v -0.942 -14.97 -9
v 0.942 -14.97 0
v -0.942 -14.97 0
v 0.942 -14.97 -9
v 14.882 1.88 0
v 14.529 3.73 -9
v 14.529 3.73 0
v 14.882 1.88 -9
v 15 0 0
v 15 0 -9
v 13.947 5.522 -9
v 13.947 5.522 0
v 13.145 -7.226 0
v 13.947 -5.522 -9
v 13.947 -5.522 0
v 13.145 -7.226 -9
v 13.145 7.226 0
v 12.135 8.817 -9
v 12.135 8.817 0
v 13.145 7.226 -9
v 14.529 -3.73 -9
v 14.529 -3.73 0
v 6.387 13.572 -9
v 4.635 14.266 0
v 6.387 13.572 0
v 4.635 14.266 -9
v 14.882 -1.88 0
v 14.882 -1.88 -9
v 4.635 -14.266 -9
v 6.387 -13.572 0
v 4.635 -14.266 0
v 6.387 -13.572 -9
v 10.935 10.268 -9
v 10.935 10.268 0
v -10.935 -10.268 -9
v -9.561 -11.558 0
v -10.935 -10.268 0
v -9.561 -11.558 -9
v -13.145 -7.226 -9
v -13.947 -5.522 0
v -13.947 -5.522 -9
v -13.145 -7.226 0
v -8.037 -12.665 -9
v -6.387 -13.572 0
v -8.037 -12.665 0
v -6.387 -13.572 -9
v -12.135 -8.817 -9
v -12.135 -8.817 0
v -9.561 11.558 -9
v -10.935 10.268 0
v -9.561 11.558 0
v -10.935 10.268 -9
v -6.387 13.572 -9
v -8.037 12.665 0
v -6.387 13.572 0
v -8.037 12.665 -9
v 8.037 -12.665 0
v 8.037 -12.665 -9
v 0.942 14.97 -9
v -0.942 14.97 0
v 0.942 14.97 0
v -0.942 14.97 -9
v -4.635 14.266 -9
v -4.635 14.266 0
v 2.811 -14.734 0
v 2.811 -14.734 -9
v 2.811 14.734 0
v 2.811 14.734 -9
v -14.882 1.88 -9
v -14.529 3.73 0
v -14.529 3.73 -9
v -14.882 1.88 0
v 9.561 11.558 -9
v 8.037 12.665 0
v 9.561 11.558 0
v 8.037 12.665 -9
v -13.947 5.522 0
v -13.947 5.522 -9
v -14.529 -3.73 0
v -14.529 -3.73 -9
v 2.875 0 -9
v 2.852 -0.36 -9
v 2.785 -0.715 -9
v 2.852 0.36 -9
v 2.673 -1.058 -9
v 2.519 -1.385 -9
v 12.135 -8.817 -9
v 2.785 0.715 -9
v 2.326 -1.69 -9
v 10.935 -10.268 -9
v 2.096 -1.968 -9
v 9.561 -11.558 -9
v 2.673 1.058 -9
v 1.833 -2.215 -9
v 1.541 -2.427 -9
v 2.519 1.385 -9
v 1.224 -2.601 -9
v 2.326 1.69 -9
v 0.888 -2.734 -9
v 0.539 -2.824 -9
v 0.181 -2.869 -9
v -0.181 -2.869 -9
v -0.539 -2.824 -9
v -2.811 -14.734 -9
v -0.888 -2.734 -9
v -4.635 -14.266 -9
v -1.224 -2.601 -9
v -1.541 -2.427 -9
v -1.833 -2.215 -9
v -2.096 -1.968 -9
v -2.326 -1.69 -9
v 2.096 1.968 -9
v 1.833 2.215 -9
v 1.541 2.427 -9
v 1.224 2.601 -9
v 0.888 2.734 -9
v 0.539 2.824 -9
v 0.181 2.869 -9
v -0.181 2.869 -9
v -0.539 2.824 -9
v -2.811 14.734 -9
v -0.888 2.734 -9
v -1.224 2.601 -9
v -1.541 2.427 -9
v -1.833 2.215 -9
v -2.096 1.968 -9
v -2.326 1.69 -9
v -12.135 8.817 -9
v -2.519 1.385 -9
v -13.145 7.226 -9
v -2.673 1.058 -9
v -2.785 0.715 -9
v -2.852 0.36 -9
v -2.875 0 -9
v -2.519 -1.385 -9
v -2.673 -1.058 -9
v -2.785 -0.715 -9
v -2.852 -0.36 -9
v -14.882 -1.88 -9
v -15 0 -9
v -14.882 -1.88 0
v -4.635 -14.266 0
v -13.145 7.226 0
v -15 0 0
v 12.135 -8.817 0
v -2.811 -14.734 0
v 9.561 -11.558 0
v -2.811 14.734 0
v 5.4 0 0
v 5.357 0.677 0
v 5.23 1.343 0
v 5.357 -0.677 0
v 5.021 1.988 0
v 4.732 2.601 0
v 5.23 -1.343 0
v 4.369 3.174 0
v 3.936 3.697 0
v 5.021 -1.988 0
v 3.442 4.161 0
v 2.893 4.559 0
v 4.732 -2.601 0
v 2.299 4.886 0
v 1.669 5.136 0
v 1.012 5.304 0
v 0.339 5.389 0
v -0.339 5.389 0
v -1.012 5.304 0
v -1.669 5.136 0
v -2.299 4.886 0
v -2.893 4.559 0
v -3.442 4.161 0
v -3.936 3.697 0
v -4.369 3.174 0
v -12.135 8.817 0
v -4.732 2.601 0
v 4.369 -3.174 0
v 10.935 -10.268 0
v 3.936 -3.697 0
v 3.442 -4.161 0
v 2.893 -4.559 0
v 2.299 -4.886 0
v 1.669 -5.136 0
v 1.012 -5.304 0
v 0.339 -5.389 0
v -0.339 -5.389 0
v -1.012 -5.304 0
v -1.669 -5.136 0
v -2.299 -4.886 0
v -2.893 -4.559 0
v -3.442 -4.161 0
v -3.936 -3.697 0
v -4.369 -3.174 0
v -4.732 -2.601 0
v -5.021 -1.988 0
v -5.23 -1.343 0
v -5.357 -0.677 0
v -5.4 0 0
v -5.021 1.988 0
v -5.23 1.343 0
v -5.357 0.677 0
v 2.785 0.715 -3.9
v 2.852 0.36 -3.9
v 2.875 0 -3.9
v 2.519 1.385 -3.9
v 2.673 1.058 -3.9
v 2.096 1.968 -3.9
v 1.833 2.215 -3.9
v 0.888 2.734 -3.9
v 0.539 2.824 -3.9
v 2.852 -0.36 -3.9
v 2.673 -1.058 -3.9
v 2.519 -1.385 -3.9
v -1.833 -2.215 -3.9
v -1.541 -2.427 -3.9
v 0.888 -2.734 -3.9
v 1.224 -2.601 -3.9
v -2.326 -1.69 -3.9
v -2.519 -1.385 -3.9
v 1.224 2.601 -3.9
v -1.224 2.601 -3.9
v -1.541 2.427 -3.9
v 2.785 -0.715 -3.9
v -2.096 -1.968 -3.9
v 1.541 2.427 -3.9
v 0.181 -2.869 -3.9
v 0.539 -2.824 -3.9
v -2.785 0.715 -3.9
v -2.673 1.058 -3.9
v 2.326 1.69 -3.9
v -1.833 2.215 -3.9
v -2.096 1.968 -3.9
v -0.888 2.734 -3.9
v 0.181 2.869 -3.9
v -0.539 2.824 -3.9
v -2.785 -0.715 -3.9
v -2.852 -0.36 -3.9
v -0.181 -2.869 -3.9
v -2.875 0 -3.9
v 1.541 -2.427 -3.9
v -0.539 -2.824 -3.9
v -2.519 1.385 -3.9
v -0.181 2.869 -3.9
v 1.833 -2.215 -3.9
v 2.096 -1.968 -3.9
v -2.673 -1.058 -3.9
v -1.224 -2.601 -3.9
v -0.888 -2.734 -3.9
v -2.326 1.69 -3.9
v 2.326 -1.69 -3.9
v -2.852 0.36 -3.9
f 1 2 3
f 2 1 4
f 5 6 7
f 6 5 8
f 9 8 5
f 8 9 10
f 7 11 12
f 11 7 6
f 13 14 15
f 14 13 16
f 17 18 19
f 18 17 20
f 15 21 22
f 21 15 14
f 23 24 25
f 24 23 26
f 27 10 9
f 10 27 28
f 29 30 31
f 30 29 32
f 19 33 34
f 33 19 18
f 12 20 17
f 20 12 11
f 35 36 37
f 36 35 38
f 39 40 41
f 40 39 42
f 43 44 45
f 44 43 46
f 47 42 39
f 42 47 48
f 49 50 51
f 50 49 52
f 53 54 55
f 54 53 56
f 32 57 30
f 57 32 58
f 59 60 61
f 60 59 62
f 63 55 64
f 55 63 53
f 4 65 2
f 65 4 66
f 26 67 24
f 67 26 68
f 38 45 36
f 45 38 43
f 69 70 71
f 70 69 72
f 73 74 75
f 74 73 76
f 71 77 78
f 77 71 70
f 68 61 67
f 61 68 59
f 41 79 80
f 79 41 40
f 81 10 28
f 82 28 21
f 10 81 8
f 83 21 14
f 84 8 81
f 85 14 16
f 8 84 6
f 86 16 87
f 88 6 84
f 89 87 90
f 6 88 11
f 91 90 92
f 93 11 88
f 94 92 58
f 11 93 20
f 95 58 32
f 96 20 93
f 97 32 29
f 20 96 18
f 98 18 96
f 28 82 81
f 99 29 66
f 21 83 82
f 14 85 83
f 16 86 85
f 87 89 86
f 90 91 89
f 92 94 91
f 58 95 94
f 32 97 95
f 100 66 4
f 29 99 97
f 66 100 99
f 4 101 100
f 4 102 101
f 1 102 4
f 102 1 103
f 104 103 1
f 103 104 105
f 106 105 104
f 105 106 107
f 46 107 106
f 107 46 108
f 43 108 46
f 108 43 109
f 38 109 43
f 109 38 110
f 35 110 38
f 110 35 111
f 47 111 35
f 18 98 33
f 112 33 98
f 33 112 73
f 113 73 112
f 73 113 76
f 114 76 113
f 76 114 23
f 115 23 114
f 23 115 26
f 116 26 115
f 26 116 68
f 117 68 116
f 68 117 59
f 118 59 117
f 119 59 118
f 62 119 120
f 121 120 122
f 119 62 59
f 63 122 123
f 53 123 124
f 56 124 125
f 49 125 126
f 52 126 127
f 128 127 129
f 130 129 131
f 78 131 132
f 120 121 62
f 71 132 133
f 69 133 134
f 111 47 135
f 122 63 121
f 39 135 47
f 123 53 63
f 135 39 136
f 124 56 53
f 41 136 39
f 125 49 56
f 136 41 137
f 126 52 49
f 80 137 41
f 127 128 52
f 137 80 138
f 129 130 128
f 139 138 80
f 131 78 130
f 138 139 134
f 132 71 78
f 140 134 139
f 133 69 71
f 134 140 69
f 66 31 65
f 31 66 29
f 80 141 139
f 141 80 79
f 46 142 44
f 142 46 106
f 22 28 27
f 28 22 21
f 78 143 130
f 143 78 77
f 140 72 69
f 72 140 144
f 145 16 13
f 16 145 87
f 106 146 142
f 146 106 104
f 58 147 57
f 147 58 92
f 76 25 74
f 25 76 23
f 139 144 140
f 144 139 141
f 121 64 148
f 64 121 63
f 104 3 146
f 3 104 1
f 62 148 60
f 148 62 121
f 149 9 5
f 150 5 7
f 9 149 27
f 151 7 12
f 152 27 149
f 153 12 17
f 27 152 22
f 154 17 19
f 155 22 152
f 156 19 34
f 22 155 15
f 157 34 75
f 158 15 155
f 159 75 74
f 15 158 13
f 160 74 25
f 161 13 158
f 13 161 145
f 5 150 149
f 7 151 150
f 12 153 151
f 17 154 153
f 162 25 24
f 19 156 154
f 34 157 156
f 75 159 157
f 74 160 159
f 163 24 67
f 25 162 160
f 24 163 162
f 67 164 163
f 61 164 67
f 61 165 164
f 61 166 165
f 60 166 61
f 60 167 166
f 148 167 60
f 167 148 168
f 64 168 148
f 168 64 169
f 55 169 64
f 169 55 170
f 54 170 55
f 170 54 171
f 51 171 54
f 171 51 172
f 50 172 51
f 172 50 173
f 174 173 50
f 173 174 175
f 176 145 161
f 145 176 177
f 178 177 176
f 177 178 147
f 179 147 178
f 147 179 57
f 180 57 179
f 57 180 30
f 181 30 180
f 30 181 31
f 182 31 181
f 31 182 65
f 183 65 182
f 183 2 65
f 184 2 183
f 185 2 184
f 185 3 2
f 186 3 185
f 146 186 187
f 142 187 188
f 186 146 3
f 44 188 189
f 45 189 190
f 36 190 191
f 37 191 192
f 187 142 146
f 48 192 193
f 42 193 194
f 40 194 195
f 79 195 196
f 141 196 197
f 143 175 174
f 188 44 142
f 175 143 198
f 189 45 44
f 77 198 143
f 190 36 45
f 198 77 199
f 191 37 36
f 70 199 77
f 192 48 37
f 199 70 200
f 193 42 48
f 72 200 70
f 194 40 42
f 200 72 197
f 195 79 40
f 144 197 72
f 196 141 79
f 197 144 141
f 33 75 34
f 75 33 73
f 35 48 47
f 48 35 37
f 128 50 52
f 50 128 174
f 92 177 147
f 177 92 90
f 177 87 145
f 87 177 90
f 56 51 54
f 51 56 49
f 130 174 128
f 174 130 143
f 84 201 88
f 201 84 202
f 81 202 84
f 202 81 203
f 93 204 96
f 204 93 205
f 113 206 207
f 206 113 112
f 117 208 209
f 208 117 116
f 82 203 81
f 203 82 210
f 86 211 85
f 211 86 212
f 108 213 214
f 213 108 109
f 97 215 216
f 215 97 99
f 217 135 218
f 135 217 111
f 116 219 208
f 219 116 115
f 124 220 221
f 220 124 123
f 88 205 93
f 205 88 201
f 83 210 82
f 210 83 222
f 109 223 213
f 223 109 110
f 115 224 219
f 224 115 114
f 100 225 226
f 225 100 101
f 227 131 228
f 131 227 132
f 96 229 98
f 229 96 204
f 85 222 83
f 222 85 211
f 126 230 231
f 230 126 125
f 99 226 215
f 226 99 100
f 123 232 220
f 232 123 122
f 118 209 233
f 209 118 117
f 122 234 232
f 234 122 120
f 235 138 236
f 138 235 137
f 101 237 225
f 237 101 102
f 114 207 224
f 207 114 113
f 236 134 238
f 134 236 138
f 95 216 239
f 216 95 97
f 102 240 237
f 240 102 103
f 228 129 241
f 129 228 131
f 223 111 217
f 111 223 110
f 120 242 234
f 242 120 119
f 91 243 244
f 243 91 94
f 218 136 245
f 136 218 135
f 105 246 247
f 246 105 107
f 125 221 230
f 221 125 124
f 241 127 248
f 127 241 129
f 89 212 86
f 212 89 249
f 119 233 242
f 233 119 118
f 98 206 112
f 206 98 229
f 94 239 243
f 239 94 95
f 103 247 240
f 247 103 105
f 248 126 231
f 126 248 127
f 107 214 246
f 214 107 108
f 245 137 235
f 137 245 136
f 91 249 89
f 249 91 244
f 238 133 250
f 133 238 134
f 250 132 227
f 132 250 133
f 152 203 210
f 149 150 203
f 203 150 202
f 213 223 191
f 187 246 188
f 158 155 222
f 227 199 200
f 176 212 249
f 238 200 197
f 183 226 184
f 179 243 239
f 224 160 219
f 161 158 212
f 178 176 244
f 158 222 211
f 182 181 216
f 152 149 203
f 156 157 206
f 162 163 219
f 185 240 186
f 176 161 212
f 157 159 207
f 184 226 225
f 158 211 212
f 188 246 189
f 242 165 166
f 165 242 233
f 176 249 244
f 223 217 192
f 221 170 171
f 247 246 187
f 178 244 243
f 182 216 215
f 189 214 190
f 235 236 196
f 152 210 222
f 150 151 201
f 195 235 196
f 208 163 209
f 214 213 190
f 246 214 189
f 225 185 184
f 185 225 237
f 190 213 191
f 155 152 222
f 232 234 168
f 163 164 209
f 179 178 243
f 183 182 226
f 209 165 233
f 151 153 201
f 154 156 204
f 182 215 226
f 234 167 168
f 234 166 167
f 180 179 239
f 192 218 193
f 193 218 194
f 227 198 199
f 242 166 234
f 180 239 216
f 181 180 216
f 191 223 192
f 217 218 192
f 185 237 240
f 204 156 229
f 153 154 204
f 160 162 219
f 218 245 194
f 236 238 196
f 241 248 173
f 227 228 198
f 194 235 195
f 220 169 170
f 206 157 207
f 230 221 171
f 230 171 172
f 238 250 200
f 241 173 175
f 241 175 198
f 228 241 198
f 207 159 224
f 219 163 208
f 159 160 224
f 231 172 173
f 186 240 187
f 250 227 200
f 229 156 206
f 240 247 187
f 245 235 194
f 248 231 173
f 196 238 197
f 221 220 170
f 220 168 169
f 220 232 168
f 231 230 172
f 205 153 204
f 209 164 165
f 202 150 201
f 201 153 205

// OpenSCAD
$fn = 50;

difference() {
	union() {
		translate(v = [0, 0, -9.0]) {
			cylinder(h = 9, r = 15.0);
		}
		#translate(v = [0, 0, -12.0]) {
			cylinder(h = 12, r = 2.875);
		}
	}
	union() {
		translate(v = [0, 0, 0]) {
			rotate(a = [0, 0, 0]) {
				difference() {
					union() {
						translate(v = [0, 0, -12.0]) {
							cylinder(h = 12, r = 2.6);
						}
						translate(v = [0, 0, -3.9]) {
							cylinder(h = 3.9, r1 = 2.875, r2 = 5.4);
						}
						translate(v = [0, 0, -12.0]) {
							cylinder(h = 12, r = 2.875);
						}
						translate(v = [0, 0, -12.0]) {
							cylinder(h = 12, r = 2.6);
						}
					}
					union();
				}
			}
		}
	}
}
